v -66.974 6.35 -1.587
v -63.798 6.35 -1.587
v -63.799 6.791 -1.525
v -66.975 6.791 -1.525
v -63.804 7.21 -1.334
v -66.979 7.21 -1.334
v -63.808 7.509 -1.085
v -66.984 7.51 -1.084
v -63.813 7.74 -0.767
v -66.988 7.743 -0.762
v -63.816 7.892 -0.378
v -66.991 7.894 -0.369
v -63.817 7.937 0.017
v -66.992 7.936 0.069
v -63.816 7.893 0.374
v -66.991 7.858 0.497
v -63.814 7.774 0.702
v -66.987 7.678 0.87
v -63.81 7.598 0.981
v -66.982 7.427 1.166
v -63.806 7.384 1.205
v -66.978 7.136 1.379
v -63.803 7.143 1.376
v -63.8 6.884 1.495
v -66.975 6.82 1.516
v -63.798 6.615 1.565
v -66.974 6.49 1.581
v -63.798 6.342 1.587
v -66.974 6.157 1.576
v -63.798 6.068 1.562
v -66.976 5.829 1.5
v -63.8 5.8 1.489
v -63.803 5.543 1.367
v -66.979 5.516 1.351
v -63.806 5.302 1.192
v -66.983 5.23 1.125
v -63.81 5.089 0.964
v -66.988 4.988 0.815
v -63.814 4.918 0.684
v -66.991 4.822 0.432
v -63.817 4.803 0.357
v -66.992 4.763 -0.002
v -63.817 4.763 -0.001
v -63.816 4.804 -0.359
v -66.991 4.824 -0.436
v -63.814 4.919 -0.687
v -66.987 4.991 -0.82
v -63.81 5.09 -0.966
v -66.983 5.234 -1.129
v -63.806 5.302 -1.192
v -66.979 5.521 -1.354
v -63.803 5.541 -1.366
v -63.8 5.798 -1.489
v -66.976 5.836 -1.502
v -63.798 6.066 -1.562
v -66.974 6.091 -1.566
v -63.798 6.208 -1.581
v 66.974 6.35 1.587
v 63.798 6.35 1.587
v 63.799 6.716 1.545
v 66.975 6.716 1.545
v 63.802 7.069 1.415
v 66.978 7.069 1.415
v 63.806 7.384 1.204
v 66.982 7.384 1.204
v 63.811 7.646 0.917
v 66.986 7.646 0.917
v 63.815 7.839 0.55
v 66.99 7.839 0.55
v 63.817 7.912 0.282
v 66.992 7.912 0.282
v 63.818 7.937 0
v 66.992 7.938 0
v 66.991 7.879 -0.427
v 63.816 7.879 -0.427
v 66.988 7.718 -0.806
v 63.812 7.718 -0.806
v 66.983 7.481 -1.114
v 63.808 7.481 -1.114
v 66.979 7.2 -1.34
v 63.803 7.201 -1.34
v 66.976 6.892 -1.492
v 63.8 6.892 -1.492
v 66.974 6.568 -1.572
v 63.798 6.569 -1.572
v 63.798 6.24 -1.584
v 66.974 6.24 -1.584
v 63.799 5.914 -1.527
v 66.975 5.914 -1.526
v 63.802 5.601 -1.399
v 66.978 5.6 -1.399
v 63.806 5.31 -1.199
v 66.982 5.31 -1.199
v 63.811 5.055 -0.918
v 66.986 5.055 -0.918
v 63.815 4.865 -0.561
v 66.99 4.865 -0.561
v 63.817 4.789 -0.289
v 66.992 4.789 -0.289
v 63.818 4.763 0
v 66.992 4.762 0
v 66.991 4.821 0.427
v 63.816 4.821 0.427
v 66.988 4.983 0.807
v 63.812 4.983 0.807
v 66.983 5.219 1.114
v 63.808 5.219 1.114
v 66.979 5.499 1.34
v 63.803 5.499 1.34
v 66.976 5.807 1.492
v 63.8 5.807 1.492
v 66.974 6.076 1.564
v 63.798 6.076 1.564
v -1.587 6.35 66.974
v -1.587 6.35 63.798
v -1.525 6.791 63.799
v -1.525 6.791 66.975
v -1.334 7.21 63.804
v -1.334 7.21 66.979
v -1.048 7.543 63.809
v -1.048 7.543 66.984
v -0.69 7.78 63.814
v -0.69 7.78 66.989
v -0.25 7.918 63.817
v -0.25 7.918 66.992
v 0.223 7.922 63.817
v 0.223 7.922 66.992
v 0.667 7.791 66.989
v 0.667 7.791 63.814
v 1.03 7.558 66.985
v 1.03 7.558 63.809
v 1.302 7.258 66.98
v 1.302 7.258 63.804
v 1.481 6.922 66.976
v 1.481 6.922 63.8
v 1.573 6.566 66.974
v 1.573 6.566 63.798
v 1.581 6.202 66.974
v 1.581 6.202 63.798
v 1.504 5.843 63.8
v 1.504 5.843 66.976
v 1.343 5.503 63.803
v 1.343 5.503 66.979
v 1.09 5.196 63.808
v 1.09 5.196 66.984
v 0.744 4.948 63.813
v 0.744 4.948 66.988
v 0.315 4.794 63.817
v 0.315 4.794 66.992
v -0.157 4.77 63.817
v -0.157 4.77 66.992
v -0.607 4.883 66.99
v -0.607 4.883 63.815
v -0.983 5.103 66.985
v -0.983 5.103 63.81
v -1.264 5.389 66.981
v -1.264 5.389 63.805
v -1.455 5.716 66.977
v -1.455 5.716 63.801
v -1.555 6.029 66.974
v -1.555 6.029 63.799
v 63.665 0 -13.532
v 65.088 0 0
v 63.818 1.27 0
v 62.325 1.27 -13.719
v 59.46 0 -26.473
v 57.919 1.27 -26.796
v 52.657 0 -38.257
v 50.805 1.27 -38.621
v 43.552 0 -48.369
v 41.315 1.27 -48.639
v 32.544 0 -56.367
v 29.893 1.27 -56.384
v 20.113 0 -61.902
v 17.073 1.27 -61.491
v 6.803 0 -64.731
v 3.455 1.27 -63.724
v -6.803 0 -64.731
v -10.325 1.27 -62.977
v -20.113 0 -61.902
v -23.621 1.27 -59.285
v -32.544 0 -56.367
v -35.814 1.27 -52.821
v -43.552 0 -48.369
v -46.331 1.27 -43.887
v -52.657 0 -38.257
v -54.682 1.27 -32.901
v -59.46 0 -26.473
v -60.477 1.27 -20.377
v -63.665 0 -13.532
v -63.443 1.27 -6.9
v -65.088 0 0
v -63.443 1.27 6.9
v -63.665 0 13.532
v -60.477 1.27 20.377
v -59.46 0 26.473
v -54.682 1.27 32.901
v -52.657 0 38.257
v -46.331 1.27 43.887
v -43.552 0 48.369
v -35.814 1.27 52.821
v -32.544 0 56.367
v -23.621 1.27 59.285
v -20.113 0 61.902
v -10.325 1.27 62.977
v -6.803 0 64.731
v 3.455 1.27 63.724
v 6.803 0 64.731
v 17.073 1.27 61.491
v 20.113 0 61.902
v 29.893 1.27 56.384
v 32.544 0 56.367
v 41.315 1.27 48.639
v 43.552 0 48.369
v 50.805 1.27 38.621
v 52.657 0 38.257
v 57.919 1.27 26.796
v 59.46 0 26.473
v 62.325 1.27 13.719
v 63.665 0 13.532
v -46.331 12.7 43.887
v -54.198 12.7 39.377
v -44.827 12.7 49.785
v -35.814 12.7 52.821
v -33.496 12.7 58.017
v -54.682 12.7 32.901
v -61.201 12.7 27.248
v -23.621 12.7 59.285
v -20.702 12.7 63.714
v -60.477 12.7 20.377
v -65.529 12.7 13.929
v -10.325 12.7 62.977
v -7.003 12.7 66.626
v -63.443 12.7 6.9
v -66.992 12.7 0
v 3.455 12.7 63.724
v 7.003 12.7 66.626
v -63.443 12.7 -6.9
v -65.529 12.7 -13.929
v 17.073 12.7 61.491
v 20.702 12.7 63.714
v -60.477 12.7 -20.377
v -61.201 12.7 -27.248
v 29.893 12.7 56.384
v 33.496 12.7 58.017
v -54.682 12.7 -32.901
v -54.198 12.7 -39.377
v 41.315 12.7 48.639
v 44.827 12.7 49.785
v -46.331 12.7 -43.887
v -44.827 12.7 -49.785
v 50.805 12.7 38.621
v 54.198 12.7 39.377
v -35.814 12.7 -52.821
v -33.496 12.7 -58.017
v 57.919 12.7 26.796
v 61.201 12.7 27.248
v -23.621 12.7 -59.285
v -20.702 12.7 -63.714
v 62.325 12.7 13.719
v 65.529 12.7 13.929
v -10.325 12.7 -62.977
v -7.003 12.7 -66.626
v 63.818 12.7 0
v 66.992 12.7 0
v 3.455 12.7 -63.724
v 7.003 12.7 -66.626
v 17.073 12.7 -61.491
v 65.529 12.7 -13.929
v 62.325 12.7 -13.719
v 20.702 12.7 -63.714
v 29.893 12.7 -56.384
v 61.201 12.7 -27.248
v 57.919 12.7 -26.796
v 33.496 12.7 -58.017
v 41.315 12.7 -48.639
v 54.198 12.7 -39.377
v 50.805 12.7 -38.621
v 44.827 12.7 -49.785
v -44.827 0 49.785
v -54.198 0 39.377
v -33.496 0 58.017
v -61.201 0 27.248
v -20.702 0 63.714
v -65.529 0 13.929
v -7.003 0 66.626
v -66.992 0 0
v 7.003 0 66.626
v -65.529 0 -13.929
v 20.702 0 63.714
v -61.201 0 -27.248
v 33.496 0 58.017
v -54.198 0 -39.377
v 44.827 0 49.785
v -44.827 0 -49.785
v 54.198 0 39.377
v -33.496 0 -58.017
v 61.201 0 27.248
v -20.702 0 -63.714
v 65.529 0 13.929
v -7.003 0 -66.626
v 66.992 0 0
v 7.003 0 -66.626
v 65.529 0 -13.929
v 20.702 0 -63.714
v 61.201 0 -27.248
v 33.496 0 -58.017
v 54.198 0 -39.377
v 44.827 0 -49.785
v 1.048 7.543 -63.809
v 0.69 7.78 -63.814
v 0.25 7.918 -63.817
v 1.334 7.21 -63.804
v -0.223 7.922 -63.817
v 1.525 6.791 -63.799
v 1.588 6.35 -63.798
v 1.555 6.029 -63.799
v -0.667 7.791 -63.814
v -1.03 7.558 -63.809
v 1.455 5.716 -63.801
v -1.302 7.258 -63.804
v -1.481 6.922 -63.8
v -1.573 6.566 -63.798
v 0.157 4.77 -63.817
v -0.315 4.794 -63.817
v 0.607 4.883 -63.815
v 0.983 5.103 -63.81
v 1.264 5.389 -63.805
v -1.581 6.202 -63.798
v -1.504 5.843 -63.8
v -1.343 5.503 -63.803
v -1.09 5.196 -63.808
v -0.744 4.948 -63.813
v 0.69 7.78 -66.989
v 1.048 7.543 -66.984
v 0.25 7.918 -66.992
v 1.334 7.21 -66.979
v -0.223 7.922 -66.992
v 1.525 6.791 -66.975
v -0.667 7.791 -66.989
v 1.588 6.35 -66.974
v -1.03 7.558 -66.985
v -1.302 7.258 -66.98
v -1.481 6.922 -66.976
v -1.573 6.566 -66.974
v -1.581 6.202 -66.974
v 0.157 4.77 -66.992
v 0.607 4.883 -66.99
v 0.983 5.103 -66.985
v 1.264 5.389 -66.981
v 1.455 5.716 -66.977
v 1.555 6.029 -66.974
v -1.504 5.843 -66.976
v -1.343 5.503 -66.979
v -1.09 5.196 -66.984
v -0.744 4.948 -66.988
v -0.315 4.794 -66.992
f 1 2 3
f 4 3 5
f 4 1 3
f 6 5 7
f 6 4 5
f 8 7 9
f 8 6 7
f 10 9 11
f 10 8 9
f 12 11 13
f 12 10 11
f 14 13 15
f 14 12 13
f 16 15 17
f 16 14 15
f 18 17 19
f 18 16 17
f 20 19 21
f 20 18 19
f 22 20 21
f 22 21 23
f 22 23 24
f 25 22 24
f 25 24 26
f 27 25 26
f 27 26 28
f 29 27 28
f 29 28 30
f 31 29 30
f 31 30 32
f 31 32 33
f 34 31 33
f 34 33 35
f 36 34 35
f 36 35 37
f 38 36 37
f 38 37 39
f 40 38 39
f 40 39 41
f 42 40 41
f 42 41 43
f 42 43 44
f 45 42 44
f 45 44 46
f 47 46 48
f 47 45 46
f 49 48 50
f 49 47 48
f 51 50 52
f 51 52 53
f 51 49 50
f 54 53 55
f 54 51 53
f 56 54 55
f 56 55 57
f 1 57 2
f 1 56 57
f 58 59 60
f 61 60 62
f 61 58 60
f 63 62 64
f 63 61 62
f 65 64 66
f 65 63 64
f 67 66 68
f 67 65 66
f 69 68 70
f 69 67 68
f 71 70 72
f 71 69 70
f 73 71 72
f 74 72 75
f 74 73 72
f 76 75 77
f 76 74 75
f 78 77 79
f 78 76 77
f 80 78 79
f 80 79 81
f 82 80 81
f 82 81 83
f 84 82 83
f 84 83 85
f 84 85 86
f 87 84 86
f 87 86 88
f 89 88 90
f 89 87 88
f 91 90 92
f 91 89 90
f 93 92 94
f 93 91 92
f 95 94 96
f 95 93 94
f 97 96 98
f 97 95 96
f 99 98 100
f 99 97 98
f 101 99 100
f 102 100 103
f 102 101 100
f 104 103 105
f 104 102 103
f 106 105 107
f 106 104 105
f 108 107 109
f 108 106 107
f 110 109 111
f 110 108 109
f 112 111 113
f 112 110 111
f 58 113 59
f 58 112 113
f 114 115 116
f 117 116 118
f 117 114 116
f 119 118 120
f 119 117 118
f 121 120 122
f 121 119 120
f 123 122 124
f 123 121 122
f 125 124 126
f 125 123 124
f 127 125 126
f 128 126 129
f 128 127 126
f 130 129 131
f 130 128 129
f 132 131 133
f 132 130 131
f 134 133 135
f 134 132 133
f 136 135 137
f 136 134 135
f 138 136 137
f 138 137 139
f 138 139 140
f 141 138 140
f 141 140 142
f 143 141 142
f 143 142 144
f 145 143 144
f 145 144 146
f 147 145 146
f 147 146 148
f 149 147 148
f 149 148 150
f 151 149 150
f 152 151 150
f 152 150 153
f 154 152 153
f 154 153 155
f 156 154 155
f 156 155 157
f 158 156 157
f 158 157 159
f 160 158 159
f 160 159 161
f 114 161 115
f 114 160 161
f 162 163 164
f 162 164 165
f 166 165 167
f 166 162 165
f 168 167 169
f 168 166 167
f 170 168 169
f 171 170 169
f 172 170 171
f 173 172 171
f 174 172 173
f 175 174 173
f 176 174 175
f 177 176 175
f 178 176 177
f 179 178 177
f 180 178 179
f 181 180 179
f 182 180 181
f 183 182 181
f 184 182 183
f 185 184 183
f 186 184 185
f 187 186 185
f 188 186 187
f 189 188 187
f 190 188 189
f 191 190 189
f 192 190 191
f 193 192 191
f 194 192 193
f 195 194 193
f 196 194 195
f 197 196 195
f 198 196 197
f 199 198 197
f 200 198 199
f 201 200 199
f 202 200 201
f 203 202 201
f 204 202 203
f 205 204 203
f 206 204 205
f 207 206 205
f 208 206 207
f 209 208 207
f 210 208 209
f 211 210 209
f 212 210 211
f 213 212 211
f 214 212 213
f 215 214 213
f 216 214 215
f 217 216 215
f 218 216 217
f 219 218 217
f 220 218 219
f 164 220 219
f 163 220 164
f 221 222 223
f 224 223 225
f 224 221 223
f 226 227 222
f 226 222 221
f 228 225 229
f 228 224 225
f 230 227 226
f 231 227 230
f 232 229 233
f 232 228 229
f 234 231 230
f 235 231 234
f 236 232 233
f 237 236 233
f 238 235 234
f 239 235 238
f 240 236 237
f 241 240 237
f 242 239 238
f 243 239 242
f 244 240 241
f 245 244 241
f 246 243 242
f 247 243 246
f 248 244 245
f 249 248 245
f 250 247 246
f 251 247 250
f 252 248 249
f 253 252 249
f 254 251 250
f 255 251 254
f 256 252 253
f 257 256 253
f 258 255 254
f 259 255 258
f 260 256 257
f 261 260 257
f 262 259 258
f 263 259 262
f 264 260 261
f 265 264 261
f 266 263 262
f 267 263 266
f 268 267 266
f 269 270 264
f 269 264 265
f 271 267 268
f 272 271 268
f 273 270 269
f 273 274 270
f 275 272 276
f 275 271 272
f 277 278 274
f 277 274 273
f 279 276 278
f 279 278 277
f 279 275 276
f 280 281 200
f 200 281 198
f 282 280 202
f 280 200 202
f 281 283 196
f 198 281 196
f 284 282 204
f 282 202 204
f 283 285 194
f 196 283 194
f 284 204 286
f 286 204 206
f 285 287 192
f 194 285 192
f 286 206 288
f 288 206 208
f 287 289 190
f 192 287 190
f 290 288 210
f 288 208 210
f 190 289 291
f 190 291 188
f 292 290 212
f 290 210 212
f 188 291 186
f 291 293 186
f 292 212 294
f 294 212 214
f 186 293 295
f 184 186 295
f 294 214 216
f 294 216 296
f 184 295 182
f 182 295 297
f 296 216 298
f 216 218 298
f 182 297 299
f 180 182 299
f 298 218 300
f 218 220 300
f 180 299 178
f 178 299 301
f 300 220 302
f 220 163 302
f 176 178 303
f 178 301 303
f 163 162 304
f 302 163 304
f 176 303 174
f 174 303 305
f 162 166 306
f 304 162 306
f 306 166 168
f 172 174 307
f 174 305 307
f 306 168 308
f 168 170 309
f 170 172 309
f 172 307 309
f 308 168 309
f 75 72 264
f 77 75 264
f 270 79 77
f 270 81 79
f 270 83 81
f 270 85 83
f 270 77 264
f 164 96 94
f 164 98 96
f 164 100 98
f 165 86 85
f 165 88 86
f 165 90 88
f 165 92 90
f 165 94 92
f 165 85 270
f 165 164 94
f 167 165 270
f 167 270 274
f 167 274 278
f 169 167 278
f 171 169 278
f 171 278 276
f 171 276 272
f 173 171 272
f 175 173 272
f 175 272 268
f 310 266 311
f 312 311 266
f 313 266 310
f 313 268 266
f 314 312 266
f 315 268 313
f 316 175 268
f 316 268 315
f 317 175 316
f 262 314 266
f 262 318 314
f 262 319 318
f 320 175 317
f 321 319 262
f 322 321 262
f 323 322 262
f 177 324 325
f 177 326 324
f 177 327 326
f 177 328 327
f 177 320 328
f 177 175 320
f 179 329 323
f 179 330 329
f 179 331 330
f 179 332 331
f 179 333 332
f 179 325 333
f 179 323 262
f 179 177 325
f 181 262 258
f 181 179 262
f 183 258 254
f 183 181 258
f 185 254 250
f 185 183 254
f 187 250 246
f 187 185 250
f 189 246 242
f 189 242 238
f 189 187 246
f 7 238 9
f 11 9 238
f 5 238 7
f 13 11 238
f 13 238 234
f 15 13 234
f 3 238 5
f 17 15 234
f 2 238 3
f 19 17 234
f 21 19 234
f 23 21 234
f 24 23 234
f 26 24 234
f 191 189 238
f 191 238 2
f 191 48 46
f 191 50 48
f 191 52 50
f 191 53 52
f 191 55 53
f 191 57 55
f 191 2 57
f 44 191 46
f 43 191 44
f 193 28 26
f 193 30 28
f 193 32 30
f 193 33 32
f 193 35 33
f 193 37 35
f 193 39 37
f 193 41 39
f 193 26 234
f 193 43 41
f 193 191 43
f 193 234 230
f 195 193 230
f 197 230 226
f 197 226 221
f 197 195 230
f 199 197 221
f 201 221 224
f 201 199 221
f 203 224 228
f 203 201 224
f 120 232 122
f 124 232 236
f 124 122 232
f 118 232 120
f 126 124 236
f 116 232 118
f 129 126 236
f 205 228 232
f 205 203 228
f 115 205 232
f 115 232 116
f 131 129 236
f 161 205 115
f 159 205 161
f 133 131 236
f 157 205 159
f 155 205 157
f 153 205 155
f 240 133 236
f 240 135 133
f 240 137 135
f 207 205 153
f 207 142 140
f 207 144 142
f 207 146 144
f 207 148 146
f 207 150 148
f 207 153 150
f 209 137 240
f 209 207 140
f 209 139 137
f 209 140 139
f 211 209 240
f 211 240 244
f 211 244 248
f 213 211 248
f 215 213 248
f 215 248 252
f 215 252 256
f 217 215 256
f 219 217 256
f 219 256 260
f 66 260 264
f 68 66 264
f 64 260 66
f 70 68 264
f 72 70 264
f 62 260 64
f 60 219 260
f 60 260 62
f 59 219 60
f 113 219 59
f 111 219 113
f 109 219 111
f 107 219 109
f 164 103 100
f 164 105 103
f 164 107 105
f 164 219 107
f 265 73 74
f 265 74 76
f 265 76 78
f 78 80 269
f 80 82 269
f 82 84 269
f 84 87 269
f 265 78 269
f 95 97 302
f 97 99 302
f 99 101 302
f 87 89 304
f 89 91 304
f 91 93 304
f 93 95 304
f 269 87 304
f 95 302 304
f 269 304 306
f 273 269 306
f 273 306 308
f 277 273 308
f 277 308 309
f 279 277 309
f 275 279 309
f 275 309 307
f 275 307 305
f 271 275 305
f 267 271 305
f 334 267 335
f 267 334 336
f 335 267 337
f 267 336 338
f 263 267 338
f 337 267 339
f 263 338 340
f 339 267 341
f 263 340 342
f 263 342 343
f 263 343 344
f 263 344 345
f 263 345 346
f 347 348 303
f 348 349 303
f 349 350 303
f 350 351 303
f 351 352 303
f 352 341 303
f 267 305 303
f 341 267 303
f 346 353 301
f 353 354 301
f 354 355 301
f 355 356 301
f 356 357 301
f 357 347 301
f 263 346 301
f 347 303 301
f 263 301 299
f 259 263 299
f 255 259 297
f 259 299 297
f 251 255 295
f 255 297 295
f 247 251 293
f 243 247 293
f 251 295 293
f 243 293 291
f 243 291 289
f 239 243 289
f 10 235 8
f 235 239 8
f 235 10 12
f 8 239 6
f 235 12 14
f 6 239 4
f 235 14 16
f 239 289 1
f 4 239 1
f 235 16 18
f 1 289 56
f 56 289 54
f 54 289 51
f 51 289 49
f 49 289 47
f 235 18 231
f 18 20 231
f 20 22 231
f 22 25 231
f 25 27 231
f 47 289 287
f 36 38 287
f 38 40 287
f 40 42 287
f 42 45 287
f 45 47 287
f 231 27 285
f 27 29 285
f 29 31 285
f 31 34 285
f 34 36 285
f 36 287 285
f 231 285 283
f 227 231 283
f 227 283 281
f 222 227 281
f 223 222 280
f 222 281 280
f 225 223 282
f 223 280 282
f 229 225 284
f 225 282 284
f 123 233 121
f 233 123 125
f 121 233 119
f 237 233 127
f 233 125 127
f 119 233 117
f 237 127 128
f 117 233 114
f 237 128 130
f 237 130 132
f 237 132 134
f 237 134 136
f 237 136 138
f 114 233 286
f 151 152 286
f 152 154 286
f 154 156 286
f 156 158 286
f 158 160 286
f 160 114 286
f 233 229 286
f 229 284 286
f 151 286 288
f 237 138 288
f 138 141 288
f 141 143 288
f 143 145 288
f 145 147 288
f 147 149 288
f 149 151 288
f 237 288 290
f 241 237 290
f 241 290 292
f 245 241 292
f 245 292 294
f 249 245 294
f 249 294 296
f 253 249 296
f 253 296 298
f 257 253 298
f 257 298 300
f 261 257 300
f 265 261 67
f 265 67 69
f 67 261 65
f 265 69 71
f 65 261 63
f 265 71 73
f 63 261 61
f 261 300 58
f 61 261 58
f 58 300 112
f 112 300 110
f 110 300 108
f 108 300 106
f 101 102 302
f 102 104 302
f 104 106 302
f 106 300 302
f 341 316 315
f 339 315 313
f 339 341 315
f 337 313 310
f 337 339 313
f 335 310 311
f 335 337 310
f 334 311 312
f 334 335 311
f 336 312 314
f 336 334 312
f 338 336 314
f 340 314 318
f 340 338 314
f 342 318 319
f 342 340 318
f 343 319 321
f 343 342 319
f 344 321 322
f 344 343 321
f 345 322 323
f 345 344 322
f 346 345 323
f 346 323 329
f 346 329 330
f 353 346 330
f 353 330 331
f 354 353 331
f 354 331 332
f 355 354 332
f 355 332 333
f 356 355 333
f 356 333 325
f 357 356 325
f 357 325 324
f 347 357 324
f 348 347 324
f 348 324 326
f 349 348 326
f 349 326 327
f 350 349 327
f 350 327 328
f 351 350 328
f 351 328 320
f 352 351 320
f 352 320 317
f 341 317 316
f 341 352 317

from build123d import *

# Parameters (mm, degrees)
SKETCH1_R           = 66.9925
SKETCH1_R_2         = 63.8175
BOSS_EXTRUDE1_DEPTH = 12.7
CUT_EXTRUDE1_START  = -66.9925
SKETCH2_R           = 1.5875
CUT_EXTRUDE1_DEPTH  = 3.194748
CIRPATTERN1_COUNT   = 4
CHAMFER1_SIZE       = 1.27


with BuildPart() as part:
    # Sketch1 → Boss-Extrude1 (new body)
    with BuildSketch(Plane(origin=(0, 0, 0), x_dir=(1, 0, 0), z_dir=(0, 1, 0))):
        Circle(SKETCH1_R)
        Circle(SKETCH1_R_2, mode=Mode.SUBTRACT)
    extrude(amount=BOSS_EXTRUDE1_DEPTH)

    # Sketch2 → Cut-Extrude1 (cut)
    with BuildSketch(Plane.XY.offset(CUT_EXTRUDE1_START)):
        with Locations((0, 6.35)):
            Circle(SKETCH2_R)
    cut_extrude1 = extrude(amount=CUT_EXTRUDE1_DEPTH, mode=Mode.SUBTRACT)

    # CirPattern1: Cut-Extrude1 ×4 about axis
    cirpattern1_axis = Axis((0, 12.7, 0), (0, -1, 0))
    for i in range(1, CIRPATTERN1_COUNT):
        add(cut_extrude1.rotate(cirpattern1_axis, i * 360 / CIRPATTERN1_COUNT), mode=Mode.SUBTRACT)

    # Chamfer1
    chamfer1_edges = [part.edges().sort_by_distance(p)[0] for p in [
        (-63.8175, 0, 0),
    ]]
    chamfer(chamfer1_edges, length=CHAMFER1_SIZE)


solid = part.part
